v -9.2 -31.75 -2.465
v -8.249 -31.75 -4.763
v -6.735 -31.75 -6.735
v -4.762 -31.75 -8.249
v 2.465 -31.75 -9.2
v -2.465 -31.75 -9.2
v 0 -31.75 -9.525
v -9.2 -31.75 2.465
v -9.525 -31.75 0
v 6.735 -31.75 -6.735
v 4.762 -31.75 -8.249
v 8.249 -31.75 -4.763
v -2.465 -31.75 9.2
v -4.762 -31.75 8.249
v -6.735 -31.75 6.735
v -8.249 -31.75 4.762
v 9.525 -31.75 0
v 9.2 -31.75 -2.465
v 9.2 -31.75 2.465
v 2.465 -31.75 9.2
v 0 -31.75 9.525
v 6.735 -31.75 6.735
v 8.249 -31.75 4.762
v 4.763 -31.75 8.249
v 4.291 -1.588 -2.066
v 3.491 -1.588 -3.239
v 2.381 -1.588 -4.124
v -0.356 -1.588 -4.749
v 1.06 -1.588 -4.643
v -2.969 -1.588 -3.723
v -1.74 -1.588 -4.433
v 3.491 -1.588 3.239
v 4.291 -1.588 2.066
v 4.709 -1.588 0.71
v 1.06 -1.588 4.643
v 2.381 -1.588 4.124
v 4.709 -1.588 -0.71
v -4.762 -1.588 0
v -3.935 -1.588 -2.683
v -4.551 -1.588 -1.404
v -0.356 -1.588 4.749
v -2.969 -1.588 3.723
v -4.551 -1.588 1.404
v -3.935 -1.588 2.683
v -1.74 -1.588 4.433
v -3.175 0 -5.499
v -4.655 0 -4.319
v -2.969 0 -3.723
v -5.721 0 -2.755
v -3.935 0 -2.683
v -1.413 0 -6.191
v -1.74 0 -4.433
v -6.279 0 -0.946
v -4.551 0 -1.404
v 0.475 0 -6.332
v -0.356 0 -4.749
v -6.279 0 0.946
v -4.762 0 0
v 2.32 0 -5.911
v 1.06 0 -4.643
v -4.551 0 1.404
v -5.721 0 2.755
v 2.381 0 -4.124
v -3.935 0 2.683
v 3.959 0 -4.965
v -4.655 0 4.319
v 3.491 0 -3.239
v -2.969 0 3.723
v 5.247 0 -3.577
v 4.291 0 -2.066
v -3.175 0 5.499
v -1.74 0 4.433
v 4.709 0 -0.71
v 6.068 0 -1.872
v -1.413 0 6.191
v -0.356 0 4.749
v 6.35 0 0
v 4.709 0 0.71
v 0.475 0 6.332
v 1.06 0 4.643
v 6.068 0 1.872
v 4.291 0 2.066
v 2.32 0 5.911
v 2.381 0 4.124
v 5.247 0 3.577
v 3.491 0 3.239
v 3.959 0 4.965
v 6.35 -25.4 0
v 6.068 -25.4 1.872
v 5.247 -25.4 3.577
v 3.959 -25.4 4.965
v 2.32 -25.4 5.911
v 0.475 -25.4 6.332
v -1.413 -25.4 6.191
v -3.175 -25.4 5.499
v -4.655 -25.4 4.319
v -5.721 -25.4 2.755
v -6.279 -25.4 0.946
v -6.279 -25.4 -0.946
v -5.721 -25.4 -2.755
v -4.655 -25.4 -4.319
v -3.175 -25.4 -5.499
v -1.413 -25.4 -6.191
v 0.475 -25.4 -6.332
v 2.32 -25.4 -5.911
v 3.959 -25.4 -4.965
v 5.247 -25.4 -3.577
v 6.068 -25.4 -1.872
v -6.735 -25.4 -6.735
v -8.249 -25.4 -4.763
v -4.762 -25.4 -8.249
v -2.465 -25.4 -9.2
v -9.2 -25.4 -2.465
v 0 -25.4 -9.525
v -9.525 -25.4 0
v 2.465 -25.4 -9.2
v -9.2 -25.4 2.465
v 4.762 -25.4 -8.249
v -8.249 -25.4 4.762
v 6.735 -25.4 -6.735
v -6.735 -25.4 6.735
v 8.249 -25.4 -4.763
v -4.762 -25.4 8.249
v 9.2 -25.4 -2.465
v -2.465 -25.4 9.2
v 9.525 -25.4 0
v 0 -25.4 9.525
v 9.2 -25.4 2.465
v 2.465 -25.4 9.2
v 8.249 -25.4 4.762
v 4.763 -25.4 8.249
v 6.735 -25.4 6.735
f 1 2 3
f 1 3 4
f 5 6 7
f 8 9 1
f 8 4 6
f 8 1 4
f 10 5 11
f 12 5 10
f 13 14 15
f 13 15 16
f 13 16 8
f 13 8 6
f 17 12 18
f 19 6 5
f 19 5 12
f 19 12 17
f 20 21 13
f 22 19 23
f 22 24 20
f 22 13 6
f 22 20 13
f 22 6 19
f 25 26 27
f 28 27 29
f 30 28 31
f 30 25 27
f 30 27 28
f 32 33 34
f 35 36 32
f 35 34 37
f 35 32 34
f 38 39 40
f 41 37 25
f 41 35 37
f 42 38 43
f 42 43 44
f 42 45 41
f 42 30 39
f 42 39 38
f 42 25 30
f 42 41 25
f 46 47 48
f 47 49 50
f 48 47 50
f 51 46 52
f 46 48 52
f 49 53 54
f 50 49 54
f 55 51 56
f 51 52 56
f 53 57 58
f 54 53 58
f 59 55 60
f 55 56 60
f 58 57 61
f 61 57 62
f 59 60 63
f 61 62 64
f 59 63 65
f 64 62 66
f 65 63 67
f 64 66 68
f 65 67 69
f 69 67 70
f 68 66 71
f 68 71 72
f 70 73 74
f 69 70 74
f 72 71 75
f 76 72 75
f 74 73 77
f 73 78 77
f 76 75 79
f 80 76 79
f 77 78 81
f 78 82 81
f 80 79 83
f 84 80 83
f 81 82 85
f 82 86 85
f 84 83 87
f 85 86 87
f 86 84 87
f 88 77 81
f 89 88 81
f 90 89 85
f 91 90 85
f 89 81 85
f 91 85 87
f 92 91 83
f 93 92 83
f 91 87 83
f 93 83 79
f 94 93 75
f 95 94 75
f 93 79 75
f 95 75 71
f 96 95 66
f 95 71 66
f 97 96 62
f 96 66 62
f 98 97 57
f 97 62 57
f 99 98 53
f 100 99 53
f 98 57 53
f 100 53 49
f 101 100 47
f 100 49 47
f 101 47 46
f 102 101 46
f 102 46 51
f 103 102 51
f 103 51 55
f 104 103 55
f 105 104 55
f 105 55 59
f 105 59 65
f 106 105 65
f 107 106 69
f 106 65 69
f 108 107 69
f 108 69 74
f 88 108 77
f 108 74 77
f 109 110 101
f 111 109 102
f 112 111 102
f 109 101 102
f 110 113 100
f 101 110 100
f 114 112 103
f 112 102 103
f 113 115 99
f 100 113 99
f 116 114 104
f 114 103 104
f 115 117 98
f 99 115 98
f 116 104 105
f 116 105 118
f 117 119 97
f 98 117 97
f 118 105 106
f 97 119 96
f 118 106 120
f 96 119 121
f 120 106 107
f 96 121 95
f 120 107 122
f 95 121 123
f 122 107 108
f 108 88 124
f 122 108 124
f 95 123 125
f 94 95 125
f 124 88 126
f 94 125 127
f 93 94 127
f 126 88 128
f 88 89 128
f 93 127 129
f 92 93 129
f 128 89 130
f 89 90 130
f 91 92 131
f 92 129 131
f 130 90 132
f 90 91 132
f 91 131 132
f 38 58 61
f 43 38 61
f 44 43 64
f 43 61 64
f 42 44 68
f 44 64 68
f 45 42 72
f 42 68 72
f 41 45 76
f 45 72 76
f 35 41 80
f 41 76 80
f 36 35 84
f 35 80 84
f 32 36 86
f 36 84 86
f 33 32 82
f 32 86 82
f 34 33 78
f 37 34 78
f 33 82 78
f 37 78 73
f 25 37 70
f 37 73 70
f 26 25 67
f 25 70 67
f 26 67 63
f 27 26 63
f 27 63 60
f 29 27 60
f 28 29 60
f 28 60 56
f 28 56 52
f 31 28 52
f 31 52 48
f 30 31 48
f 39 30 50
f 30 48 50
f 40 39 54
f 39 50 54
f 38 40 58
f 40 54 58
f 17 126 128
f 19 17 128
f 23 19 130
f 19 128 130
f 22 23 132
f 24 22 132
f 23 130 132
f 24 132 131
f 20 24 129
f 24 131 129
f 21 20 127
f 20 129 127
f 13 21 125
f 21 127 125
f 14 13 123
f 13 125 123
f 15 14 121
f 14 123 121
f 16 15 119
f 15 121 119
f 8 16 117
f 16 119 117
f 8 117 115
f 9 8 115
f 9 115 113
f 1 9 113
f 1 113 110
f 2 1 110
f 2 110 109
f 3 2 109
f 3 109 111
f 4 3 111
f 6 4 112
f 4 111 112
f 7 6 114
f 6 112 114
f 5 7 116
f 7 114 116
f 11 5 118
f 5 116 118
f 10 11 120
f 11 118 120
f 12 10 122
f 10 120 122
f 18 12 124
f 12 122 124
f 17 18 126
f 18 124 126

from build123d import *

# Parameters (mm, degrees)
F0_R     = 6.35
F1_DEPTH = 25.4
F2_R     = 4.7625
F3_DEPTH = 1.5875
F4_R     = 9.525
F5_DEPTH = 6.35


with BuildPart() as f1:
    # F0 (on Front) → F1 (new body)
    with BuildSketch(Plane.XZ):
        Circle(F0_R)
    extrude(amount=F1_DEPTH)

    # F2 (on face) → F3 (cut)
    with BuildSketch(Plane(origin=(0, 0, 0), x_dir=(-1, 0, 0), z_dir=(0, 1, 0))):
        Circle(F2_R)
    extrude(amount=-F3_DEPTH, mode=Mode.SUBTRACT)

    # F4 (on face) → F5 (join)
    with BuildSketch(Plane.XZ.offset(25.4)):
        Circle(F4_R)
    extrude(amount=F5_DEPTH)


solid = f1.part
